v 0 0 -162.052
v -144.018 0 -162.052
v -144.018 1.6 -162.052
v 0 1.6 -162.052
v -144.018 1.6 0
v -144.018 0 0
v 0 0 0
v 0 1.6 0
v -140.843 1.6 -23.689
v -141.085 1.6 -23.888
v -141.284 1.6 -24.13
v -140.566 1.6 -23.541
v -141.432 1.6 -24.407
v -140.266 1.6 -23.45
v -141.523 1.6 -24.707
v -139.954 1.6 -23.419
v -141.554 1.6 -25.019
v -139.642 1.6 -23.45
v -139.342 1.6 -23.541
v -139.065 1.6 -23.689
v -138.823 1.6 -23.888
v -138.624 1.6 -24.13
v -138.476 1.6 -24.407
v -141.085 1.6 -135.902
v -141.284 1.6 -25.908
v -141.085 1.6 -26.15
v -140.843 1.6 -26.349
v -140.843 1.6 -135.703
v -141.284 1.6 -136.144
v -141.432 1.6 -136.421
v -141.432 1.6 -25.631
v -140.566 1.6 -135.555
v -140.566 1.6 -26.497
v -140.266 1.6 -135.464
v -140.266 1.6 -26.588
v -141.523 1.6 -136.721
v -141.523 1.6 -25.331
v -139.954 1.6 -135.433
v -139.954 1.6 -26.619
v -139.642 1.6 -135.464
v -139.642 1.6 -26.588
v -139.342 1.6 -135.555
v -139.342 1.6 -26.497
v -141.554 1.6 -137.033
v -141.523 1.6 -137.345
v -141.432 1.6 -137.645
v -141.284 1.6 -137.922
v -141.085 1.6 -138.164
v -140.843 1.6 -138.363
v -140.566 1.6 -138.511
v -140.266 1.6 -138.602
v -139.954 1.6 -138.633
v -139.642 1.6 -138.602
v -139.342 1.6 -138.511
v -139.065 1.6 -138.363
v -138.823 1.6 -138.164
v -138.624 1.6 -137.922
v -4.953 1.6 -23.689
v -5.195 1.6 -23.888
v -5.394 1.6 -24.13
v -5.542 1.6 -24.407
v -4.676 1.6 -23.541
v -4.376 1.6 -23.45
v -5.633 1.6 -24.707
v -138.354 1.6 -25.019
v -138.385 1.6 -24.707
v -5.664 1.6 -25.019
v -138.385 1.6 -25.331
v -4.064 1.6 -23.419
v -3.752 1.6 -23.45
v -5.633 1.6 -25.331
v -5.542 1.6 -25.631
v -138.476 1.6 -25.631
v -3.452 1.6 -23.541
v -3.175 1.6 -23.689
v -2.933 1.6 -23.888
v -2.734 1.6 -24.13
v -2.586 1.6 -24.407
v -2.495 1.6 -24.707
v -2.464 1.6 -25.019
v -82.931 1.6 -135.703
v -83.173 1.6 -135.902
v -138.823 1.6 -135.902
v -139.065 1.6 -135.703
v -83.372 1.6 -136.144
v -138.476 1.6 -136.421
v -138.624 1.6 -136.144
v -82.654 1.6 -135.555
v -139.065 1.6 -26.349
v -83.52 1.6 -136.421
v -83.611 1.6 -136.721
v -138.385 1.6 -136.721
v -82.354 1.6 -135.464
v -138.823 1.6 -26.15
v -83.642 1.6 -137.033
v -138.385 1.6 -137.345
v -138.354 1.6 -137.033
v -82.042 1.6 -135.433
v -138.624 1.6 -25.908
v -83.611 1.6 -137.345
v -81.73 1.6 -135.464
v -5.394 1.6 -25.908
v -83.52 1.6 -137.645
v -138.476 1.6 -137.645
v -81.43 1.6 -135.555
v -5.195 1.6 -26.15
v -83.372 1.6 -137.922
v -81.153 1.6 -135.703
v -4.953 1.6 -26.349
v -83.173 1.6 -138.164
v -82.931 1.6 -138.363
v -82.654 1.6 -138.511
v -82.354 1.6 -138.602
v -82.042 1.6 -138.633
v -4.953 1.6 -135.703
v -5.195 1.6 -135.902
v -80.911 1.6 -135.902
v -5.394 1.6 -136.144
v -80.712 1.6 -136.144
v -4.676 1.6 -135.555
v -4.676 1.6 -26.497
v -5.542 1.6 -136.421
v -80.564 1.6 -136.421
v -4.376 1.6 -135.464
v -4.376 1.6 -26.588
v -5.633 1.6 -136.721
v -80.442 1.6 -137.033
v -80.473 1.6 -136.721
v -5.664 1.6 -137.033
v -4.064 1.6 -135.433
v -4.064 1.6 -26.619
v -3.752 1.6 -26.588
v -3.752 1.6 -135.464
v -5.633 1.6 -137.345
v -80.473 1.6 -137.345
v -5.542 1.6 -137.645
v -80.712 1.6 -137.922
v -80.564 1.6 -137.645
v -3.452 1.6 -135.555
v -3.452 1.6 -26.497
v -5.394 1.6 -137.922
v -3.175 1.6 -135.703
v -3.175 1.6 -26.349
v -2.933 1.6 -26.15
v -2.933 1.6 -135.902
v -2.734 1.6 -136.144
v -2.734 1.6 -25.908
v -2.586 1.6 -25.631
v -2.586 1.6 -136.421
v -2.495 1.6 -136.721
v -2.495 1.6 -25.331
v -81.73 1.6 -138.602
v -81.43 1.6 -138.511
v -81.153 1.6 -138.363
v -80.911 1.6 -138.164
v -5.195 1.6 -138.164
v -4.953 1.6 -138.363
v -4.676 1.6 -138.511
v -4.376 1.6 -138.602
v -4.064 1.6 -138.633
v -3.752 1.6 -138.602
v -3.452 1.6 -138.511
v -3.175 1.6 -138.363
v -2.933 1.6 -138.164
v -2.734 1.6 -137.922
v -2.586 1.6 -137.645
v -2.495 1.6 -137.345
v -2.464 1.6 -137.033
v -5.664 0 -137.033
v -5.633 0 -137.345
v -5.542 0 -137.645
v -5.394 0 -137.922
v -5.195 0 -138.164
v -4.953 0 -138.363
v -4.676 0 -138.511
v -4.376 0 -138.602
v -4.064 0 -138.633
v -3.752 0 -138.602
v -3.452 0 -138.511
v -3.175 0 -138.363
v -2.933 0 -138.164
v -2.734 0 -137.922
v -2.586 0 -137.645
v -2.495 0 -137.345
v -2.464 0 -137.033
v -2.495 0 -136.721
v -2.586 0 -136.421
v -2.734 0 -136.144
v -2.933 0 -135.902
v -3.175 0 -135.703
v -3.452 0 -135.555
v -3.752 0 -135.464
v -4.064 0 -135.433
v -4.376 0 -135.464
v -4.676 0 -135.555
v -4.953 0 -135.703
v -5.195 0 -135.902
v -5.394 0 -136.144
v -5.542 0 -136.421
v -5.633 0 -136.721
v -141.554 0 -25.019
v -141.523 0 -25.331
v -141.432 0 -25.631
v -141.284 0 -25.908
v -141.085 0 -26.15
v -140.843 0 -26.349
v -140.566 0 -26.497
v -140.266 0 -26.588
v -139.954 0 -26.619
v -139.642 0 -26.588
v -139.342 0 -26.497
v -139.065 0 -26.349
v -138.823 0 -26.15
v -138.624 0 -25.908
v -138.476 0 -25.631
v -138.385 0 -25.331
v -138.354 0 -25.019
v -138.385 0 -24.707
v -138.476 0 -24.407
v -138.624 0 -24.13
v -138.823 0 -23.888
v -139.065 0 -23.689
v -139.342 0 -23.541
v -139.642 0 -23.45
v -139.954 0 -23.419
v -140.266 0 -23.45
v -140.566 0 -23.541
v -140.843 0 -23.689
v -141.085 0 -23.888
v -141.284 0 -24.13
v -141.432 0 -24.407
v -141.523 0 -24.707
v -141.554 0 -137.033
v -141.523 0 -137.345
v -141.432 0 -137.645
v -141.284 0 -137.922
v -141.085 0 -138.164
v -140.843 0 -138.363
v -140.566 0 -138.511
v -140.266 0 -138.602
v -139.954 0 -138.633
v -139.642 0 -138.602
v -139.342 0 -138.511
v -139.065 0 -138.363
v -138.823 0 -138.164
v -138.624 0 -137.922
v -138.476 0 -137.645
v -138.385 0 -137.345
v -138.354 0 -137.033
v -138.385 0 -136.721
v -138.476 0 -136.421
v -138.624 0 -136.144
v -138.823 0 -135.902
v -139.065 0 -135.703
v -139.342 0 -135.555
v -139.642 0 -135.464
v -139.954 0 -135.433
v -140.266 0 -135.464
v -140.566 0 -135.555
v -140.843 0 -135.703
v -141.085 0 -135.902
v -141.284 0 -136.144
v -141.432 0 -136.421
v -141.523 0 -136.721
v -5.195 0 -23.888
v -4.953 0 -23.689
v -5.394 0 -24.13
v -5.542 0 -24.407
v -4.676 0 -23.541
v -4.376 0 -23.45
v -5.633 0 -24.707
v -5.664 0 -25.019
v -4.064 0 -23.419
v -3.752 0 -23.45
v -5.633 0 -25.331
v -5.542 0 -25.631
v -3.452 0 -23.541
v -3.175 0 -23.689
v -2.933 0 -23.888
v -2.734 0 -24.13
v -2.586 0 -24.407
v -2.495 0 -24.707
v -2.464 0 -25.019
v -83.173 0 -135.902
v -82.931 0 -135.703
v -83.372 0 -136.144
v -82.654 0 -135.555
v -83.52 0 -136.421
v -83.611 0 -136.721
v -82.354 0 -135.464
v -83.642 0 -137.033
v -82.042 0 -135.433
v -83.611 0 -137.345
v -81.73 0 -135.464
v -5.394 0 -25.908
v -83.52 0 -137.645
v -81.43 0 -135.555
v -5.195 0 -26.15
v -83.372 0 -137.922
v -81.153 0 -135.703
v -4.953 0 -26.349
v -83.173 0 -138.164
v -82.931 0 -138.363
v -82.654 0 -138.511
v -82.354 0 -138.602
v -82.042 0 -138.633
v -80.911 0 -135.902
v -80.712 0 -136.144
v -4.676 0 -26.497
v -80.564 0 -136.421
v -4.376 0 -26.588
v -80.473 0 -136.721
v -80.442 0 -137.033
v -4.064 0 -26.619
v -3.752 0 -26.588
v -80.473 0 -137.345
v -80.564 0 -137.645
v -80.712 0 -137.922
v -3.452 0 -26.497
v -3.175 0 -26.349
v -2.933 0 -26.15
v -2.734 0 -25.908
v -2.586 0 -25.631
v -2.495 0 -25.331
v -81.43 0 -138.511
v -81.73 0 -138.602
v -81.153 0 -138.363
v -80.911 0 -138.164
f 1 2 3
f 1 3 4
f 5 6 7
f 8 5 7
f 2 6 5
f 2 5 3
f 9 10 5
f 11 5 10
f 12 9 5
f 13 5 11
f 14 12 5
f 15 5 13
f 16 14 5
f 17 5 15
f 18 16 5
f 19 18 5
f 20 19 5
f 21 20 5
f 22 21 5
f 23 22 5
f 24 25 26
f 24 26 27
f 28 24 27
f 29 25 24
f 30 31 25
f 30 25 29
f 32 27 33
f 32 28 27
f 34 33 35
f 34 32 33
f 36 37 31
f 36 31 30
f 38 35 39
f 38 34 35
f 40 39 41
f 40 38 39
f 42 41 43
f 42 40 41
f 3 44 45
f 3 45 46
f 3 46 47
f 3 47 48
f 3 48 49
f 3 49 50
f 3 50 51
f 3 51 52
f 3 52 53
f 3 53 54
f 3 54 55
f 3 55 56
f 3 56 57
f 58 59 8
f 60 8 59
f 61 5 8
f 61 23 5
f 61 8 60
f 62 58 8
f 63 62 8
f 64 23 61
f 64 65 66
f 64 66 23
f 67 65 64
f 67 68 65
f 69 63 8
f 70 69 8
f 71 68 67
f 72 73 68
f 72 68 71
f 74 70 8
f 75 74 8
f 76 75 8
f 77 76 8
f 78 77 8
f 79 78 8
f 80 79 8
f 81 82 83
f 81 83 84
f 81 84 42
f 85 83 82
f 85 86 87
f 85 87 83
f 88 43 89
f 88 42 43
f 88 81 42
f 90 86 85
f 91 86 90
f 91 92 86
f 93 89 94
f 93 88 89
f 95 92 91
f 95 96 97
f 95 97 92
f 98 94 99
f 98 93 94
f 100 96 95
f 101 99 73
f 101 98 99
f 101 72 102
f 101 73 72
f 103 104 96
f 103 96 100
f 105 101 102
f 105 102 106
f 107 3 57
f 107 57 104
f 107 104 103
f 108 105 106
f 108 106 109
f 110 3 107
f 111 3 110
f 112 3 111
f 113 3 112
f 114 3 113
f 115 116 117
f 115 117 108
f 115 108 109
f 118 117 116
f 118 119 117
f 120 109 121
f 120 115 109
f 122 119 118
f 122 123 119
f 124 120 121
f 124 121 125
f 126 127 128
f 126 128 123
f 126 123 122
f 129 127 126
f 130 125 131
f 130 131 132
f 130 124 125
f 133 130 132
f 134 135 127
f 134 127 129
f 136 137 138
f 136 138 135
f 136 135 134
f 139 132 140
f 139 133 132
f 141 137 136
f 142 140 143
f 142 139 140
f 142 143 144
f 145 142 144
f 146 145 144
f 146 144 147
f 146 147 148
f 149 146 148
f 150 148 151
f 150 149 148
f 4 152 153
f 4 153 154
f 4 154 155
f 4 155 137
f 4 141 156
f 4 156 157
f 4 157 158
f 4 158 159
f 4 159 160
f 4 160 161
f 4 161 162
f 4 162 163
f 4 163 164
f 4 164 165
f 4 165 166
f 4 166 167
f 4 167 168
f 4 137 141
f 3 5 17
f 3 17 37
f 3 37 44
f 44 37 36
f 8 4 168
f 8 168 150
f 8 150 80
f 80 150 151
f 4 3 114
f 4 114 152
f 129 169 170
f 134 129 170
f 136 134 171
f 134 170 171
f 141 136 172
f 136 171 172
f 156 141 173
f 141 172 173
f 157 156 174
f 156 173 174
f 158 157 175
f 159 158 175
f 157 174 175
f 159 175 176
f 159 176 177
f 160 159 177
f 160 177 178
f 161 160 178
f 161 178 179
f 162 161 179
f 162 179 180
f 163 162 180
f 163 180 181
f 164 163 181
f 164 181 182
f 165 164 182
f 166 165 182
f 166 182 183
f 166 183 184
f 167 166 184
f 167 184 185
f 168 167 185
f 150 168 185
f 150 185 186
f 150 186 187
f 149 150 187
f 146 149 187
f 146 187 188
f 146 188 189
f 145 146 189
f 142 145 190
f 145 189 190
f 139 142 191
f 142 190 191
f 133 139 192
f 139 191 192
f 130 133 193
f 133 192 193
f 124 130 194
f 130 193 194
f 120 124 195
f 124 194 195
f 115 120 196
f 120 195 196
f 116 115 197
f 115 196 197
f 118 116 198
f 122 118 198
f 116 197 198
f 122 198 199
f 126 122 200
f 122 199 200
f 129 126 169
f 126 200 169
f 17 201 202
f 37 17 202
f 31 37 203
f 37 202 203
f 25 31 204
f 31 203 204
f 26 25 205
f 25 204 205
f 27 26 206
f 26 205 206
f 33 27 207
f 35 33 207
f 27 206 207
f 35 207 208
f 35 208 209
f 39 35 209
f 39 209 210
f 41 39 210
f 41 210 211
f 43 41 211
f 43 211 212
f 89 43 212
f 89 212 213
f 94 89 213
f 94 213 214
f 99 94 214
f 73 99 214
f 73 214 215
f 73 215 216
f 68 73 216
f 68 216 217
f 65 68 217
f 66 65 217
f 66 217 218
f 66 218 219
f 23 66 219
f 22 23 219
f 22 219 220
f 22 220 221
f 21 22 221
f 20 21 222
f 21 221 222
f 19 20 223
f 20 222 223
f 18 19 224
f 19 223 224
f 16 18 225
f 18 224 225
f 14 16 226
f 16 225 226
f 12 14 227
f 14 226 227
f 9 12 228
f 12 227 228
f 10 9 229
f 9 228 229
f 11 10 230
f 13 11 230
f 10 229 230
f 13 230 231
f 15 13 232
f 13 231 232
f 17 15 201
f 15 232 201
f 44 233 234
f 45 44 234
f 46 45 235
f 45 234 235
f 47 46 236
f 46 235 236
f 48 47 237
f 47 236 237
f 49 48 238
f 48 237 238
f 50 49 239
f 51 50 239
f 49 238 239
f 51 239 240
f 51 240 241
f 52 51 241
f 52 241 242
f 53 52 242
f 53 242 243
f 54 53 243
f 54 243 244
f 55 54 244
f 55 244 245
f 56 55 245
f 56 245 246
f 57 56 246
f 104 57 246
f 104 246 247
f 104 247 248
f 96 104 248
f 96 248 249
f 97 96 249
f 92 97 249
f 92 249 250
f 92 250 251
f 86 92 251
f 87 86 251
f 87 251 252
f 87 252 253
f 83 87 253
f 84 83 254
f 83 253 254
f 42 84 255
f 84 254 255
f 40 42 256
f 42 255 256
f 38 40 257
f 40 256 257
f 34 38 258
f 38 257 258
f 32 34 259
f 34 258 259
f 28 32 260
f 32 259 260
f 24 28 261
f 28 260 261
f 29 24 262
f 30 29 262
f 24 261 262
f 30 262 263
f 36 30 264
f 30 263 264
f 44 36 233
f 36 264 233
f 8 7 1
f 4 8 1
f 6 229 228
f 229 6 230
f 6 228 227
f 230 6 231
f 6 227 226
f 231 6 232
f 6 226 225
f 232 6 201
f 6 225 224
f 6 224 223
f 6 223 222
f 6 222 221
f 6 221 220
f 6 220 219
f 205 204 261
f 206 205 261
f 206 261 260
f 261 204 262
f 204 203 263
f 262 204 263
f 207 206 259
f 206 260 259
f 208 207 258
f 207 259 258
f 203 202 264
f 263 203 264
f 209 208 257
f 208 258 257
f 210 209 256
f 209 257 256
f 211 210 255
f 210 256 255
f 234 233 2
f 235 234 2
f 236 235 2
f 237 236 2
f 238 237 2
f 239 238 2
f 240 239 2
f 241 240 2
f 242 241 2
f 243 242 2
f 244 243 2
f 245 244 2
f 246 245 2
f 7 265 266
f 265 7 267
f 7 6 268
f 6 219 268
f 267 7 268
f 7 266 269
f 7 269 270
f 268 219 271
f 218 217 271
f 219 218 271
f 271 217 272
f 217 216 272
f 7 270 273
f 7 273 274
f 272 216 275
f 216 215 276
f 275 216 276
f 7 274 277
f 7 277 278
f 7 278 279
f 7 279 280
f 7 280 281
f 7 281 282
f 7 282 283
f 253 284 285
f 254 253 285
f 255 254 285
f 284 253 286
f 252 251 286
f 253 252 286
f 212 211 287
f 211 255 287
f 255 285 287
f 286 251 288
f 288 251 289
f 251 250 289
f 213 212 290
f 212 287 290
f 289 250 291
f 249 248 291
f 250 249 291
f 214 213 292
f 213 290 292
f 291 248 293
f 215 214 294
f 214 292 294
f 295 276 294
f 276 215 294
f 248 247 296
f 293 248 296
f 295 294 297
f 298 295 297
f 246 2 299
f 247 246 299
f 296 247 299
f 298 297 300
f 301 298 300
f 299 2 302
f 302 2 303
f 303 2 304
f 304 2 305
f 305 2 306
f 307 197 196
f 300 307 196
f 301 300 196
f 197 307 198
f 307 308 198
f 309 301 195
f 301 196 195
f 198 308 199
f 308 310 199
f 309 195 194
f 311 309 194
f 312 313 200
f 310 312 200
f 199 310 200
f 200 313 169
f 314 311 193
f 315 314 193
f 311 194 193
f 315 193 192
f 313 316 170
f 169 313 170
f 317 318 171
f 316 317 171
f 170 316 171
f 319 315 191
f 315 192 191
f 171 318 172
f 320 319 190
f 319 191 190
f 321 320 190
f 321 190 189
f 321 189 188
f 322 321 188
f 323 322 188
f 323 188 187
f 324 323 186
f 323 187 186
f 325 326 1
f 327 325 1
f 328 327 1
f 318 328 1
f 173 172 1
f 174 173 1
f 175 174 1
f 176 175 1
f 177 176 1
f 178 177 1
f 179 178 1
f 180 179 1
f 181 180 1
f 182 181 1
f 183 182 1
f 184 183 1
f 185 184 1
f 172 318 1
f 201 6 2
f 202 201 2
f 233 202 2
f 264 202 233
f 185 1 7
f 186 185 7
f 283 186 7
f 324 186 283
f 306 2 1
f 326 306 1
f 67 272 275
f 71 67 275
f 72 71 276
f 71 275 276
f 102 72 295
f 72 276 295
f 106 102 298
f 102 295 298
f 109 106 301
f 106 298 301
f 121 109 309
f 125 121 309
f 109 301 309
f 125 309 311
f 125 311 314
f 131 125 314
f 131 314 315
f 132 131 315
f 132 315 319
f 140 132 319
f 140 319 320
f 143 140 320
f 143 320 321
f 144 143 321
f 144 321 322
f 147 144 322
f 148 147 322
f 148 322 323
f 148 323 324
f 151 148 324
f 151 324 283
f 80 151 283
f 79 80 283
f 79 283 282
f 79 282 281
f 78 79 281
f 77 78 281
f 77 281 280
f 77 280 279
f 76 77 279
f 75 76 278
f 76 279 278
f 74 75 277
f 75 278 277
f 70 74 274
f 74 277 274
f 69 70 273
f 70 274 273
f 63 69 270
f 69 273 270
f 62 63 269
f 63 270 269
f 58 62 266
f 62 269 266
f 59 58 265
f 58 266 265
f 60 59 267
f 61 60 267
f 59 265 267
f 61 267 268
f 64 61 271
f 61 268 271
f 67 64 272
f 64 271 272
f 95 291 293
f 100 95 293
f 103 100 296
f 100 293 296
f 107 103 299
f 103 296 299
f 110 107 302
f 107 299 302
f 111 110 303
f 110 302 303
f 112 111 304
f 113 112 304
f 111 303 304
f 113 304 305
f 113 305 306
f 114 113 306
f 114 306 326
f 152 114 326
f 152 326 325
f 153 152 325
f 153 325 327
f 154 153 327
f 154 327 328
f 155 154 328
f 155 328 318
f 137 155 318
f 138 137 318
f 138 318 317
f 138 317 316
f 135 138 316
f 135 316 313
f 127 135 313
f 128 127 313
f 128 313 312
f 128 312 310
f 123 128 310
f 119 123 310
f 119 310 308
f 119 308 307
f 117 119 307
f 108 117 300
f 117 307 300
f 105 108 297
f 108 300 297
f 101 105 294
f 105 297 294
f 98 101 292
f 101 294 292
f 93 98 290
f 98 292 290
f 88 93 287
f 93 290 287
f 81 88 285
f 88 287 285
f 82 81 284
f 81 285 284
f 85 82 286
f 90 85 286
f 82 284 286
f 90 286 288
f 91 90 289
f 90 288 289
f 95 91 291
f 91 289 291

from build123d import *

# Parameters (mm, degrees)
SKETCH_2_W      = 144.018
SKETCH_2_H      = 162.052
EXTRUDE_1_DEPTH = 1.6
F_5_0MM_1_D     = 3.2


with BuildPart() as part:
    # 草圖2 → 填料-伸長1 (new body)
    with BuildSketch(Plane(origin=(0, 0, 0), x_dir=(1, 0, 0), z_dir=(0, 1, 0))):
        with Locations((-72.009, 81.026)):
            Rectangle(SKETCH_2_W, SKETCH_2_H)
    extrude(amount=EXTRUDE_1_DEPTH)

    # Ø5.0mm 定位孔1 (through all)
    with Locations(Plane(origin=(0, 1.6, 0), x_dir=(1, 0, 0), z_dir=(0, 1, 0))):
        with Locations((-139.954, 137.033), (-82.042, 137.033), (-4.064, 137.033), (-4.064, 25.019), (-139.954, 25.019)):
            Hole(F_5_0MM_1_D / 2)


solid = part.part
